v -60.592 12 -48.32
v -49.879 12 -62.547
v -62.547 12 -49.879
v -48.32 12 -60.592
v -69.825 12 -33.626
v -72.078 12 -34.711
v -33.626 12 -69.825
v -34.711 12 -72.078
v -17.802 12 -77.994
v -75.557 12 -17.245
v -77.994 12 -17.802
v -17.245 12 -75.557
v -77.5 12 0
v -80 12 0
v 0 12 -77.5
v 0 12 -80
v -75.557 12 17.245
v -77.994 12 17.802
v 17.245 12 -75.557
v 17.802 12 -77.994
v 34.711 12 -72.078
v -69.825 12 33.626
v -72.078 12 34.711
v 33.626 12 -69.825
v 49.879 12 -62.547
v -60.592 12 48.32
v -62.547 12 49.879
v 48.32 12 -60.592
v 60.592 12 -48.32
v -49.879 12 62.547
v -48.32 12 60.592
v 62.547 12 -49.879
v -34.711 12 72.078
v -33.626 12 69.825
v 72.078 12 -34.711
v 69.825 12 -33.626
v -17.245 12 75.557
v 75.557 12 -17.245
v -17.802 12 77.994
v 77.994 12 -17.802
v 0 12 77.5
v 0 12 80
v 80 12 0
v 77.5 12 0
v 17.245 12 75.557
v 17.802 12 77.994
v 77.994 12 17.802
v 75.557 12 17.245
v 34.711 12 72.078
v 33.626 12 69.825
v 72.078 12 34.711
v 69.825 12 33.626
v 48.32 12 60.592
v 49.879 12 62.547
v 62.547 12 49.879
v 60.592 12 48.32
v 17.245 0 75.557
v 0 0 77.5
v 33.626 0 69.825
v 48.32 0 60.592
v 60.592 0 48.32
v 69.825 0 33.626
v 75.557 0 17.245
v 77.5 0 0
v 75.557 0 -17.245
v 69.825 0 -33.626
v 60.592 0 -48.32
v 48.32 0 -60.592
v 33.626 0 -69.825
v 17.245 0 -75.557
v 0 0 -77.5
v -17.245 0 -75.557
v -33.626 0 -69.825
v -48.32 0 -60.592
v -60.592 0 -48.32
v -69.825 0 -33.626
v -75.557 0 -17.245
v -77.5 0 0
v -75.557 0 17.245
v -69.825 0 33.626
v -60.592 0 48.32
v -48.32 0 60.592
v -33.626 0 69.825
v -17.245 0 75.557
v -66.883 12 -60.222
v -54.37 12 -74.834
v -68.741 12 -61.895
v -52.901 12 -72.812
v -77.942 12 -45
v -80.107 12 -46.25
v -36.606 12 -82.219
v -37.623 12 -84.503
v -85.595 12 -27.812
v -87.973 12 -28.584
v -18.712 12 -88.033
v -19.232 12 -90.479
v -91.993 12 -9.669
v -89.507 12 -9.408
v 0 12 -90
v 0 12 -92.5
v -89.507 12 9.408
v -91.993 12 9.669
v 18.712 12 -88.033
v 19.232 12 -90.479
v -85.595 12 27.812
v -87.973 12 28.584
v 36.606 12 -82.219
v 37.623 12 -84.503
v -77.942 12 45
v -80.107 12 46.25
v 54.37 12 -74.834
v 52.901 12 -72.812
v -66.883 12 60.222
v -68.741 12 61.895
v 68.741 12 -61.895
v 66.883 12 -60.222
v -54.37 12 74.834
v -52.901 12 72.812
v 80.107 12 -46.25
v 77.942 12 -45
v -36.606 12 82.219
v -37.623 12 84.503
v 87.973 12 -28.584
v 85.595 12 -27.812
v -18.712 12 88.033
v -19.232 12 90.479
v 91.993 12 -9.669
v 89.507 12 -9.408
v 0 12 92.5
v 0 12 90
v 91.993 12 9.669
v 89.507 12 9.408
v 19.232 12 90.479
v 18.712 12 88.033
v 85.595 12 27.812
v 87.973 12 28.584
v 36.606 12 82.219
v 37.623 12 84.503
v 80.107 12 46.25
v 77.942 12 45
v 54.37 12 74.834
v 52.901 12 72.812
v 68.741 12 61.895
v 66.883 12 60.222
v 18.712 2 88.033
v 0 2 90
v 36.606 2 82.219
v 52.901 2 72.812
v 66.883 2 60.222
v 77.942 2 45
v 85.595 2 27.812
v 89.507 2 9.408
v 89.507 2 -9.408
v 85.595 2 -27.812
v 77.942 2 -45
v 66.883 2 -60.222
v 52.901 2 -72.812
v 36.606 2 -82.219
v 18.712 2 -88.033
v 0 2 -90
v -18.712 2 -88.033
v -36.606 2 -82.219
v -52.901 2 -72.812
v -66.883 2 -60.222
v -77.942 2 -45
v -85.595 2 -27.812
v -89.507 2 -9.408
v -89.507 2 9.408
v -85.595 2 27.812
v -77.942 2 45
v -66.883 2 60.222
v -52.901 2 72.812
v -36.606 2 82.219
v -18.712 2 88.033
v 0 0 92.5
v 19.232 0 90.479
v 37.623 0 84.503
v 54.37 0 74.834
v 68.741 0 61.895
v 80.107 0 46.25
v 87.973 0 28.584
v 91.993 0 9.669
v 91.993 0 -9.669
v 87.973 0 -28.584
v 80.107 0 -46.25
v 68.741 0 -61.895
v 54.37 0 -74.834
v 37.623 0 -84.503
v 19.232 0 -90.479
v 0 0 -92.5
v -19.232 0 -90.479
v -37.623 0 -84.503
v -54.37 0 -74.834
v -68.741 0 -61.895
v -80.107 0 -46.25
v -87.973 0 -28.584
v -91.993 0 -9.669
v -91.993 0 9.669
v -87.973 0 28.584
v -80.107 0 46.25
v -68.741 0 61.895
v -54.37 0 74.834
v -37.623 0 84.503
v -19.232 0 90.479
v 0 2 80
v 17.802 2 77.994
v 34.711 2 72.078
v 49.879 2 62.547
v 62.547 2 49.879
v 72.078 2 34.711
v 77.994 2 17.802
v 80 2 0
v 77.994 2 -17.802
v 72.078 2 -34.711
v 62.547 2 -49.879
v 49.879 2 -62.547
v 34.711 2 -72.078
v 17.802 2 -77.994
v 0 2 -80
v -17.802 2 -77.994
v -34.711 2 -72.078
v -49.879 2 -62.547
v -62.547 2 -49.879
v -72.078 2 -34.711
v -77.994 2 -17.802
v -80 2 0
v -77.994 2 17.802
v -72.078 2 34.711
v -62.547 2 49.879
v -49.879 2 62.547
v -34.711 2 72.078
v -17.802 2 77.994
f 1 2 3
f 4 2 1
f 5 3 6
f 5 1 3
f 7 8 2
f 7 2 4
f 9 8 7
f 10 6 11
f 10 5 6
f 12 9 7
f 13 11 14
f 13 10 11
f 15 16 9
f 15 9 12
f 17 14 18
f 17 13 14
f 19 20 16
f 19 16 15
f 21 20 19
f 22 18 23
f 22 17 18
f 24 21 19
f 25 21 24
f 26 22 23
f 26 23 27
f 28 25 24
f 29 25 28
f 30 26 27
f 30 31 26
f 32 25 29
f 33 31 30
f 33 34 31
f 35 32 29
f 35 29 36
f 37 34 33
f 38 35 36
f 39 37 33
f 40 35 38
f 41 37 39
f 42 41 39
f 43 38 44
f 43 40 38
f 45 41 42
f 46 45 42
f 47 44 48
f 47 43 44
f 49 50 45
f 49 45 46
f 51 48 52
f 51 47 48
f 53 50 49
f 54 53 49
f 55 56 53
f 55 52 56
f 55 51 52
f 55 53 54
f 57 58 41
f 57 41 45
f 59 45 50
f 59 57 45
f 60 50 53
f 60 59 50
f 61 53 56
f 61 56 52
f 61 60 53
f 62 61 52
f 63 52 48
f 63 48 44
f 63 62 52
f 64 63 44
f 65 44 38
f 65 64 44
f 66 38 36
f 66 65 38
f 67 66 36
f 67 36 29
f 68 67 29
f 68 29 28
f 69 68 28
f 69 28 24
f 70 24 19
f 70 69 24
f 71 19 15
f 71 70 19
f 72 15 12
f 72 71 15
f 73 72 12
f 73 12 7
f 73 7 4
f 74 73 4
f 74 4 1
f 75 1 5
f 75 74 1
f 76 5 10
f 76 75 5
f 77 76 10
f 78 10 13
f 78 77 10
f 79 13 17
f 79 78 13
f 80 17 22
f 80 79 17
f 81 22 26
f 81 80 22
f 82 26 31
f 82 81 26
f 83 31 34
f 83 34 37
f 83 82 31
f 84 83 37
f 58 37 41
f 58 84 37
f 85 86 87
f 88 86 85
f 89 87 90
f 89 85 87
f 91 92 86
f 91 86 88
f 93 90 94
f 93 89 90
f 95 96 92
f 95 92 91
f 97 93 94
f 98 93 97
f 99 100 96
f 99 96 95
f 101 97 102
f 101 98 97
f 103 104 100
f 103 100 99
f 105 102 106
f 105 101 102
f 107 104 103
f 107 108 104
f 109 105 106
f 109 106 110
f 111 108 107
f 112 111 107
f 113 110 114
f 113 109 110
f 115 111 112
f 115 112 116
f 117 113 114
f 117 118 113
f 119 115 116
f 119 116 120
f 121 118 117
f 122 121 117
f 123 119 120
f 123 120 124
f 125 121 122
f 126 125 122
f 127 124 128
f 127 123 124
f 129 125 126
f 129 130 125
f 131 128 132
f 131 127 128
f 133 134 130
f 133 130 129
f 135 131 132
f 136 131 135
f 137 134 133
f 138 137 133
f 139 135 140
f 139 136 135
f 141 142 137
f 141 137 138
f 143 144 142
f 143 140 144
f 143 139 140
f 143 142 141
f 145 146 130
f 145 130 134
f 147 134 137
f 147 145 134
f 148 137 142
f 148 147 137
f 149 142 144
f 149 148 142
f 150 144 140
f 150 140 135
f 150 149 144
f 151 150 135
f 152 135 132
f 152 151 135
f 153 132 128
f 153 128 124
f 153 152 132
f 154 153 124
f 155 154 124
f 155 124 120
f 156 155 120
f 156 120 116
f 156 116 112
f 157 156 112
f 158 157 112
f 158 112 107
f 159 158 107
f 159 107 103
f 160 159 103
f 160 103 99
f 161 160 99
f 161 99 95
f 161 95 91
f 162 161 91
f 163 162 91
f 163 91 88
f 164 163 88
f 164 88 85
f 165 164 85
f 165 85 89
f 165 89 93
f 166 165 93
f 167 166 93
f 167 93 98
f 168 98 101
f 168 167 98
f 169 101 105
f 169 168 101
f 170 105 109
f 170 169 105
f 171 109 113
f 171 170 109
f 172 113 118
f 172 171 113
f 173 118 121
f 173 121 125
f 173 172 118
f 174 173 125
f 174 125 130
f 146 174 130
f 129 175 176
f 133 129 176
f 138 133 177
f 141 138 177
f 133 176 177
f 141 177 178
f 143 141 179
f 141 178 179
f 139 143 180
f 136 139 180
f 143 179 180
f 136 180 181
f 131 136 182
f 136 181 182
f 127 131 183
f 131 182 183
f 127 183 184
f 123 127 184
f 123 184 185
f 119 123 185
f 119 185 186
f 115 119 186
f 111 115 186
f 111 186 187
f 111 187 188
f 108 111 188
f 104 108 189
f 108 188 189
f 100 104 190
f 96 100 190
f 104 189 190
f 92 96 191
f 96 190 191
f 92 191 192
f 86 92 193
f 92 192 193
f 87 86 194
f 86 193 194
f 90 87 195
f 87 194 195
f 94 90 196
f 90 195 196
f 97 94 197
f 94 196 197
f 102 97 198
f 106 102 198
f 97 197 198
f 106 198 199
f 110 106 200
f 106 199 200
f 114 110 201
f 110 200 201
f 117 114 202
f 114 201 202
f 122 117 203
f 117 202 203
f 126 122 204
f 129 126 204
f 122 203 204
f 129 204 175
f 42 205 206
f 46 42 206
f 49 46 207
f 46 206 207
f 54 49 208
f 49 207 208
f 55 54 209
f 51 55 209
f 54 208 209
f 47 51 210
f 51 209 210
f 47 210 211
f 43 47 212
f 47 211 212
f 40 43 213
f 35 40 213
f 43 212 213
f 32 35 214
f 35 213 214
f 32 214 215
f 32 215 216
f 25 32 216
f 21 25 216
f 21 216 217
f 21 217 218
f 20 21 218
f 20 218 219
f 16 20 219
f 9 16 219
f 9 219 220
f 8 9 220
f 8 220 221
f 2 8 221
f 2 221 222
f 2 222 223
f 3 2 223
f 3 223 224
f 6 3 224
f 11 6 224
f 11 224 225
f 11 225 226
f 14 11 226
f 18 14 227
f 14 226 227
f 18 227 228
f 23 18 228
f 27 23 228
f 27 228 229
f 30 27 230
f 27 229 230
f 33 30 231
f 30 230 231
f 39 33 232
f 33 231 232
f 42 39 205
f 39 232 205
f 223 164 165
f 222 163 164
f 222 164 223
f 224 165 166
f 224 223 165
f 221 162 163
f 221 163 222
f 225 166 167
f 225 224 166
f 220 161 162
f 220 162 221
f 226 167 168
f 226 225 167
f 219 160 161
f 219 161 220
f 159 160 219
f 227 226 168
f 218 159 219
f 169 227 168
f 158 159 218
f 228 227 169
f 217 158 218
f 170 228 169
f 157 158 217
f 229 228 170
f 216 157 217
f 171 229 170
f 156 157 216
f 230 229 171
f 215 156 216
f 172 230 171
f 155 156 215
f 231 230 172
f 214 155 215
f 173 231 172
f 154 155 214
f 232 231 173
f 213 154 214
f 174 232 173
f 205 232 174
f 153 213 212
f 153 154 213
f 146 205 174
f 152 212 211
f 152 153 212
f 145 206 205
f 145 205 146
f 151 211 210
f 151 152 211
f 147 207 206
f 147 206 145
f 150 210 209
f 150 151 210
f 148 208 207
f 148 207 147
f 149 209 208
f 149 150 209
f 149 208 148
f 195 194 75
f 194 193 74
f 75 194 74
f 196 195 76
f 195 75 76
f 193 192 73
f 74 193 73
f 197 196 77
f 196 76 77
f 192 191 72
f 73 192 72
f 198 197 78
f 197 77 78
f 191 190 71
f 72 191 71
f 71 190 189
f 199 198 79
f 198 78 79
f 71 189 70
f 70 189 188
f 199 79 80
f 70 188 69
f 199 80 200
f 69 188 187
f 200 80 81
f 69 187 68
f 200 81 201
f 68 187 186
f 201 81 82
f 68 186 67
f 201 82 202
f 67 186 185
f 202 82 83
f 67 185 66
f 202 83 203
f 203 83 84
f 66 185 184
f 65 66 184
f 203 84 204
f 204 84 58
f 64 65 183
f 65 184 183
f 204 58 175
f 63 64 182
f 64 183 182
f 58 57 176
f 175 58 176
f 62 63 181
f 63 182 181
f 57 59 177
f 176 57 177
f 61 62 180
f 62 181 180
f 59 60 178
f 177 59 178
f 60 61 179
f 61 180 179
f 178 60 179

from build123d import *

# Parameters (mm, degrees)
SKETCH_1_R      = 90
SKETCH_1_R_2    = 80
EXTRUDE_1_DEPTH = 2
SKETCH_1_3_R    = 92.5
SKETCH_1_3_R_2  = 90
SKETCH_1_3_R_3  = 80
SKETCH_1_3_R_4  = 77.5
EXTRUDE_2_DEPTH = 12


with BuildPart() as part:
    # 草图1 → 凸台-拉伸1 (new body)
    with BuildSketch(Plane(origin=(0, 0, 0), x_dir=(1, 0, 0), z_dir=(0, 1, 0))):
        Circle(SKETCH_1_R)
        Circle(SKETCH_1_R_2, mode=Mode.SUBTRACT)
    extrude(amount=EXTRUDE_1_DEPTH)

    # 草图1<3> → 凸台-拉伸2 (add)
    # profile 1 of 2: a face of its own
    with BuildSketch(Plane(origin=(0, 0, 0), x_dir=(1, 0, 0), z_dir=(0, 1, 0))):
        Circle(SKETCH_1_3_R)
        Circle(SKETCH_1_3_R_2, mode=Mode.SUBTRACT)
    # profile 2 of 2: a face of its own
    with BuildSketch(Plane(origin=(0, 0, 0), x_dir=(1, 0, 0), z_dir=(0, 1, 0))):
        Circle(SKETCH_1_3_R_3)
        Circle(SKETCH_1_3_R_4, mode=Mode.SUBTRACT)
    extrude(amount=EXTRUDE_2_DEPTH)


solid = part.part
